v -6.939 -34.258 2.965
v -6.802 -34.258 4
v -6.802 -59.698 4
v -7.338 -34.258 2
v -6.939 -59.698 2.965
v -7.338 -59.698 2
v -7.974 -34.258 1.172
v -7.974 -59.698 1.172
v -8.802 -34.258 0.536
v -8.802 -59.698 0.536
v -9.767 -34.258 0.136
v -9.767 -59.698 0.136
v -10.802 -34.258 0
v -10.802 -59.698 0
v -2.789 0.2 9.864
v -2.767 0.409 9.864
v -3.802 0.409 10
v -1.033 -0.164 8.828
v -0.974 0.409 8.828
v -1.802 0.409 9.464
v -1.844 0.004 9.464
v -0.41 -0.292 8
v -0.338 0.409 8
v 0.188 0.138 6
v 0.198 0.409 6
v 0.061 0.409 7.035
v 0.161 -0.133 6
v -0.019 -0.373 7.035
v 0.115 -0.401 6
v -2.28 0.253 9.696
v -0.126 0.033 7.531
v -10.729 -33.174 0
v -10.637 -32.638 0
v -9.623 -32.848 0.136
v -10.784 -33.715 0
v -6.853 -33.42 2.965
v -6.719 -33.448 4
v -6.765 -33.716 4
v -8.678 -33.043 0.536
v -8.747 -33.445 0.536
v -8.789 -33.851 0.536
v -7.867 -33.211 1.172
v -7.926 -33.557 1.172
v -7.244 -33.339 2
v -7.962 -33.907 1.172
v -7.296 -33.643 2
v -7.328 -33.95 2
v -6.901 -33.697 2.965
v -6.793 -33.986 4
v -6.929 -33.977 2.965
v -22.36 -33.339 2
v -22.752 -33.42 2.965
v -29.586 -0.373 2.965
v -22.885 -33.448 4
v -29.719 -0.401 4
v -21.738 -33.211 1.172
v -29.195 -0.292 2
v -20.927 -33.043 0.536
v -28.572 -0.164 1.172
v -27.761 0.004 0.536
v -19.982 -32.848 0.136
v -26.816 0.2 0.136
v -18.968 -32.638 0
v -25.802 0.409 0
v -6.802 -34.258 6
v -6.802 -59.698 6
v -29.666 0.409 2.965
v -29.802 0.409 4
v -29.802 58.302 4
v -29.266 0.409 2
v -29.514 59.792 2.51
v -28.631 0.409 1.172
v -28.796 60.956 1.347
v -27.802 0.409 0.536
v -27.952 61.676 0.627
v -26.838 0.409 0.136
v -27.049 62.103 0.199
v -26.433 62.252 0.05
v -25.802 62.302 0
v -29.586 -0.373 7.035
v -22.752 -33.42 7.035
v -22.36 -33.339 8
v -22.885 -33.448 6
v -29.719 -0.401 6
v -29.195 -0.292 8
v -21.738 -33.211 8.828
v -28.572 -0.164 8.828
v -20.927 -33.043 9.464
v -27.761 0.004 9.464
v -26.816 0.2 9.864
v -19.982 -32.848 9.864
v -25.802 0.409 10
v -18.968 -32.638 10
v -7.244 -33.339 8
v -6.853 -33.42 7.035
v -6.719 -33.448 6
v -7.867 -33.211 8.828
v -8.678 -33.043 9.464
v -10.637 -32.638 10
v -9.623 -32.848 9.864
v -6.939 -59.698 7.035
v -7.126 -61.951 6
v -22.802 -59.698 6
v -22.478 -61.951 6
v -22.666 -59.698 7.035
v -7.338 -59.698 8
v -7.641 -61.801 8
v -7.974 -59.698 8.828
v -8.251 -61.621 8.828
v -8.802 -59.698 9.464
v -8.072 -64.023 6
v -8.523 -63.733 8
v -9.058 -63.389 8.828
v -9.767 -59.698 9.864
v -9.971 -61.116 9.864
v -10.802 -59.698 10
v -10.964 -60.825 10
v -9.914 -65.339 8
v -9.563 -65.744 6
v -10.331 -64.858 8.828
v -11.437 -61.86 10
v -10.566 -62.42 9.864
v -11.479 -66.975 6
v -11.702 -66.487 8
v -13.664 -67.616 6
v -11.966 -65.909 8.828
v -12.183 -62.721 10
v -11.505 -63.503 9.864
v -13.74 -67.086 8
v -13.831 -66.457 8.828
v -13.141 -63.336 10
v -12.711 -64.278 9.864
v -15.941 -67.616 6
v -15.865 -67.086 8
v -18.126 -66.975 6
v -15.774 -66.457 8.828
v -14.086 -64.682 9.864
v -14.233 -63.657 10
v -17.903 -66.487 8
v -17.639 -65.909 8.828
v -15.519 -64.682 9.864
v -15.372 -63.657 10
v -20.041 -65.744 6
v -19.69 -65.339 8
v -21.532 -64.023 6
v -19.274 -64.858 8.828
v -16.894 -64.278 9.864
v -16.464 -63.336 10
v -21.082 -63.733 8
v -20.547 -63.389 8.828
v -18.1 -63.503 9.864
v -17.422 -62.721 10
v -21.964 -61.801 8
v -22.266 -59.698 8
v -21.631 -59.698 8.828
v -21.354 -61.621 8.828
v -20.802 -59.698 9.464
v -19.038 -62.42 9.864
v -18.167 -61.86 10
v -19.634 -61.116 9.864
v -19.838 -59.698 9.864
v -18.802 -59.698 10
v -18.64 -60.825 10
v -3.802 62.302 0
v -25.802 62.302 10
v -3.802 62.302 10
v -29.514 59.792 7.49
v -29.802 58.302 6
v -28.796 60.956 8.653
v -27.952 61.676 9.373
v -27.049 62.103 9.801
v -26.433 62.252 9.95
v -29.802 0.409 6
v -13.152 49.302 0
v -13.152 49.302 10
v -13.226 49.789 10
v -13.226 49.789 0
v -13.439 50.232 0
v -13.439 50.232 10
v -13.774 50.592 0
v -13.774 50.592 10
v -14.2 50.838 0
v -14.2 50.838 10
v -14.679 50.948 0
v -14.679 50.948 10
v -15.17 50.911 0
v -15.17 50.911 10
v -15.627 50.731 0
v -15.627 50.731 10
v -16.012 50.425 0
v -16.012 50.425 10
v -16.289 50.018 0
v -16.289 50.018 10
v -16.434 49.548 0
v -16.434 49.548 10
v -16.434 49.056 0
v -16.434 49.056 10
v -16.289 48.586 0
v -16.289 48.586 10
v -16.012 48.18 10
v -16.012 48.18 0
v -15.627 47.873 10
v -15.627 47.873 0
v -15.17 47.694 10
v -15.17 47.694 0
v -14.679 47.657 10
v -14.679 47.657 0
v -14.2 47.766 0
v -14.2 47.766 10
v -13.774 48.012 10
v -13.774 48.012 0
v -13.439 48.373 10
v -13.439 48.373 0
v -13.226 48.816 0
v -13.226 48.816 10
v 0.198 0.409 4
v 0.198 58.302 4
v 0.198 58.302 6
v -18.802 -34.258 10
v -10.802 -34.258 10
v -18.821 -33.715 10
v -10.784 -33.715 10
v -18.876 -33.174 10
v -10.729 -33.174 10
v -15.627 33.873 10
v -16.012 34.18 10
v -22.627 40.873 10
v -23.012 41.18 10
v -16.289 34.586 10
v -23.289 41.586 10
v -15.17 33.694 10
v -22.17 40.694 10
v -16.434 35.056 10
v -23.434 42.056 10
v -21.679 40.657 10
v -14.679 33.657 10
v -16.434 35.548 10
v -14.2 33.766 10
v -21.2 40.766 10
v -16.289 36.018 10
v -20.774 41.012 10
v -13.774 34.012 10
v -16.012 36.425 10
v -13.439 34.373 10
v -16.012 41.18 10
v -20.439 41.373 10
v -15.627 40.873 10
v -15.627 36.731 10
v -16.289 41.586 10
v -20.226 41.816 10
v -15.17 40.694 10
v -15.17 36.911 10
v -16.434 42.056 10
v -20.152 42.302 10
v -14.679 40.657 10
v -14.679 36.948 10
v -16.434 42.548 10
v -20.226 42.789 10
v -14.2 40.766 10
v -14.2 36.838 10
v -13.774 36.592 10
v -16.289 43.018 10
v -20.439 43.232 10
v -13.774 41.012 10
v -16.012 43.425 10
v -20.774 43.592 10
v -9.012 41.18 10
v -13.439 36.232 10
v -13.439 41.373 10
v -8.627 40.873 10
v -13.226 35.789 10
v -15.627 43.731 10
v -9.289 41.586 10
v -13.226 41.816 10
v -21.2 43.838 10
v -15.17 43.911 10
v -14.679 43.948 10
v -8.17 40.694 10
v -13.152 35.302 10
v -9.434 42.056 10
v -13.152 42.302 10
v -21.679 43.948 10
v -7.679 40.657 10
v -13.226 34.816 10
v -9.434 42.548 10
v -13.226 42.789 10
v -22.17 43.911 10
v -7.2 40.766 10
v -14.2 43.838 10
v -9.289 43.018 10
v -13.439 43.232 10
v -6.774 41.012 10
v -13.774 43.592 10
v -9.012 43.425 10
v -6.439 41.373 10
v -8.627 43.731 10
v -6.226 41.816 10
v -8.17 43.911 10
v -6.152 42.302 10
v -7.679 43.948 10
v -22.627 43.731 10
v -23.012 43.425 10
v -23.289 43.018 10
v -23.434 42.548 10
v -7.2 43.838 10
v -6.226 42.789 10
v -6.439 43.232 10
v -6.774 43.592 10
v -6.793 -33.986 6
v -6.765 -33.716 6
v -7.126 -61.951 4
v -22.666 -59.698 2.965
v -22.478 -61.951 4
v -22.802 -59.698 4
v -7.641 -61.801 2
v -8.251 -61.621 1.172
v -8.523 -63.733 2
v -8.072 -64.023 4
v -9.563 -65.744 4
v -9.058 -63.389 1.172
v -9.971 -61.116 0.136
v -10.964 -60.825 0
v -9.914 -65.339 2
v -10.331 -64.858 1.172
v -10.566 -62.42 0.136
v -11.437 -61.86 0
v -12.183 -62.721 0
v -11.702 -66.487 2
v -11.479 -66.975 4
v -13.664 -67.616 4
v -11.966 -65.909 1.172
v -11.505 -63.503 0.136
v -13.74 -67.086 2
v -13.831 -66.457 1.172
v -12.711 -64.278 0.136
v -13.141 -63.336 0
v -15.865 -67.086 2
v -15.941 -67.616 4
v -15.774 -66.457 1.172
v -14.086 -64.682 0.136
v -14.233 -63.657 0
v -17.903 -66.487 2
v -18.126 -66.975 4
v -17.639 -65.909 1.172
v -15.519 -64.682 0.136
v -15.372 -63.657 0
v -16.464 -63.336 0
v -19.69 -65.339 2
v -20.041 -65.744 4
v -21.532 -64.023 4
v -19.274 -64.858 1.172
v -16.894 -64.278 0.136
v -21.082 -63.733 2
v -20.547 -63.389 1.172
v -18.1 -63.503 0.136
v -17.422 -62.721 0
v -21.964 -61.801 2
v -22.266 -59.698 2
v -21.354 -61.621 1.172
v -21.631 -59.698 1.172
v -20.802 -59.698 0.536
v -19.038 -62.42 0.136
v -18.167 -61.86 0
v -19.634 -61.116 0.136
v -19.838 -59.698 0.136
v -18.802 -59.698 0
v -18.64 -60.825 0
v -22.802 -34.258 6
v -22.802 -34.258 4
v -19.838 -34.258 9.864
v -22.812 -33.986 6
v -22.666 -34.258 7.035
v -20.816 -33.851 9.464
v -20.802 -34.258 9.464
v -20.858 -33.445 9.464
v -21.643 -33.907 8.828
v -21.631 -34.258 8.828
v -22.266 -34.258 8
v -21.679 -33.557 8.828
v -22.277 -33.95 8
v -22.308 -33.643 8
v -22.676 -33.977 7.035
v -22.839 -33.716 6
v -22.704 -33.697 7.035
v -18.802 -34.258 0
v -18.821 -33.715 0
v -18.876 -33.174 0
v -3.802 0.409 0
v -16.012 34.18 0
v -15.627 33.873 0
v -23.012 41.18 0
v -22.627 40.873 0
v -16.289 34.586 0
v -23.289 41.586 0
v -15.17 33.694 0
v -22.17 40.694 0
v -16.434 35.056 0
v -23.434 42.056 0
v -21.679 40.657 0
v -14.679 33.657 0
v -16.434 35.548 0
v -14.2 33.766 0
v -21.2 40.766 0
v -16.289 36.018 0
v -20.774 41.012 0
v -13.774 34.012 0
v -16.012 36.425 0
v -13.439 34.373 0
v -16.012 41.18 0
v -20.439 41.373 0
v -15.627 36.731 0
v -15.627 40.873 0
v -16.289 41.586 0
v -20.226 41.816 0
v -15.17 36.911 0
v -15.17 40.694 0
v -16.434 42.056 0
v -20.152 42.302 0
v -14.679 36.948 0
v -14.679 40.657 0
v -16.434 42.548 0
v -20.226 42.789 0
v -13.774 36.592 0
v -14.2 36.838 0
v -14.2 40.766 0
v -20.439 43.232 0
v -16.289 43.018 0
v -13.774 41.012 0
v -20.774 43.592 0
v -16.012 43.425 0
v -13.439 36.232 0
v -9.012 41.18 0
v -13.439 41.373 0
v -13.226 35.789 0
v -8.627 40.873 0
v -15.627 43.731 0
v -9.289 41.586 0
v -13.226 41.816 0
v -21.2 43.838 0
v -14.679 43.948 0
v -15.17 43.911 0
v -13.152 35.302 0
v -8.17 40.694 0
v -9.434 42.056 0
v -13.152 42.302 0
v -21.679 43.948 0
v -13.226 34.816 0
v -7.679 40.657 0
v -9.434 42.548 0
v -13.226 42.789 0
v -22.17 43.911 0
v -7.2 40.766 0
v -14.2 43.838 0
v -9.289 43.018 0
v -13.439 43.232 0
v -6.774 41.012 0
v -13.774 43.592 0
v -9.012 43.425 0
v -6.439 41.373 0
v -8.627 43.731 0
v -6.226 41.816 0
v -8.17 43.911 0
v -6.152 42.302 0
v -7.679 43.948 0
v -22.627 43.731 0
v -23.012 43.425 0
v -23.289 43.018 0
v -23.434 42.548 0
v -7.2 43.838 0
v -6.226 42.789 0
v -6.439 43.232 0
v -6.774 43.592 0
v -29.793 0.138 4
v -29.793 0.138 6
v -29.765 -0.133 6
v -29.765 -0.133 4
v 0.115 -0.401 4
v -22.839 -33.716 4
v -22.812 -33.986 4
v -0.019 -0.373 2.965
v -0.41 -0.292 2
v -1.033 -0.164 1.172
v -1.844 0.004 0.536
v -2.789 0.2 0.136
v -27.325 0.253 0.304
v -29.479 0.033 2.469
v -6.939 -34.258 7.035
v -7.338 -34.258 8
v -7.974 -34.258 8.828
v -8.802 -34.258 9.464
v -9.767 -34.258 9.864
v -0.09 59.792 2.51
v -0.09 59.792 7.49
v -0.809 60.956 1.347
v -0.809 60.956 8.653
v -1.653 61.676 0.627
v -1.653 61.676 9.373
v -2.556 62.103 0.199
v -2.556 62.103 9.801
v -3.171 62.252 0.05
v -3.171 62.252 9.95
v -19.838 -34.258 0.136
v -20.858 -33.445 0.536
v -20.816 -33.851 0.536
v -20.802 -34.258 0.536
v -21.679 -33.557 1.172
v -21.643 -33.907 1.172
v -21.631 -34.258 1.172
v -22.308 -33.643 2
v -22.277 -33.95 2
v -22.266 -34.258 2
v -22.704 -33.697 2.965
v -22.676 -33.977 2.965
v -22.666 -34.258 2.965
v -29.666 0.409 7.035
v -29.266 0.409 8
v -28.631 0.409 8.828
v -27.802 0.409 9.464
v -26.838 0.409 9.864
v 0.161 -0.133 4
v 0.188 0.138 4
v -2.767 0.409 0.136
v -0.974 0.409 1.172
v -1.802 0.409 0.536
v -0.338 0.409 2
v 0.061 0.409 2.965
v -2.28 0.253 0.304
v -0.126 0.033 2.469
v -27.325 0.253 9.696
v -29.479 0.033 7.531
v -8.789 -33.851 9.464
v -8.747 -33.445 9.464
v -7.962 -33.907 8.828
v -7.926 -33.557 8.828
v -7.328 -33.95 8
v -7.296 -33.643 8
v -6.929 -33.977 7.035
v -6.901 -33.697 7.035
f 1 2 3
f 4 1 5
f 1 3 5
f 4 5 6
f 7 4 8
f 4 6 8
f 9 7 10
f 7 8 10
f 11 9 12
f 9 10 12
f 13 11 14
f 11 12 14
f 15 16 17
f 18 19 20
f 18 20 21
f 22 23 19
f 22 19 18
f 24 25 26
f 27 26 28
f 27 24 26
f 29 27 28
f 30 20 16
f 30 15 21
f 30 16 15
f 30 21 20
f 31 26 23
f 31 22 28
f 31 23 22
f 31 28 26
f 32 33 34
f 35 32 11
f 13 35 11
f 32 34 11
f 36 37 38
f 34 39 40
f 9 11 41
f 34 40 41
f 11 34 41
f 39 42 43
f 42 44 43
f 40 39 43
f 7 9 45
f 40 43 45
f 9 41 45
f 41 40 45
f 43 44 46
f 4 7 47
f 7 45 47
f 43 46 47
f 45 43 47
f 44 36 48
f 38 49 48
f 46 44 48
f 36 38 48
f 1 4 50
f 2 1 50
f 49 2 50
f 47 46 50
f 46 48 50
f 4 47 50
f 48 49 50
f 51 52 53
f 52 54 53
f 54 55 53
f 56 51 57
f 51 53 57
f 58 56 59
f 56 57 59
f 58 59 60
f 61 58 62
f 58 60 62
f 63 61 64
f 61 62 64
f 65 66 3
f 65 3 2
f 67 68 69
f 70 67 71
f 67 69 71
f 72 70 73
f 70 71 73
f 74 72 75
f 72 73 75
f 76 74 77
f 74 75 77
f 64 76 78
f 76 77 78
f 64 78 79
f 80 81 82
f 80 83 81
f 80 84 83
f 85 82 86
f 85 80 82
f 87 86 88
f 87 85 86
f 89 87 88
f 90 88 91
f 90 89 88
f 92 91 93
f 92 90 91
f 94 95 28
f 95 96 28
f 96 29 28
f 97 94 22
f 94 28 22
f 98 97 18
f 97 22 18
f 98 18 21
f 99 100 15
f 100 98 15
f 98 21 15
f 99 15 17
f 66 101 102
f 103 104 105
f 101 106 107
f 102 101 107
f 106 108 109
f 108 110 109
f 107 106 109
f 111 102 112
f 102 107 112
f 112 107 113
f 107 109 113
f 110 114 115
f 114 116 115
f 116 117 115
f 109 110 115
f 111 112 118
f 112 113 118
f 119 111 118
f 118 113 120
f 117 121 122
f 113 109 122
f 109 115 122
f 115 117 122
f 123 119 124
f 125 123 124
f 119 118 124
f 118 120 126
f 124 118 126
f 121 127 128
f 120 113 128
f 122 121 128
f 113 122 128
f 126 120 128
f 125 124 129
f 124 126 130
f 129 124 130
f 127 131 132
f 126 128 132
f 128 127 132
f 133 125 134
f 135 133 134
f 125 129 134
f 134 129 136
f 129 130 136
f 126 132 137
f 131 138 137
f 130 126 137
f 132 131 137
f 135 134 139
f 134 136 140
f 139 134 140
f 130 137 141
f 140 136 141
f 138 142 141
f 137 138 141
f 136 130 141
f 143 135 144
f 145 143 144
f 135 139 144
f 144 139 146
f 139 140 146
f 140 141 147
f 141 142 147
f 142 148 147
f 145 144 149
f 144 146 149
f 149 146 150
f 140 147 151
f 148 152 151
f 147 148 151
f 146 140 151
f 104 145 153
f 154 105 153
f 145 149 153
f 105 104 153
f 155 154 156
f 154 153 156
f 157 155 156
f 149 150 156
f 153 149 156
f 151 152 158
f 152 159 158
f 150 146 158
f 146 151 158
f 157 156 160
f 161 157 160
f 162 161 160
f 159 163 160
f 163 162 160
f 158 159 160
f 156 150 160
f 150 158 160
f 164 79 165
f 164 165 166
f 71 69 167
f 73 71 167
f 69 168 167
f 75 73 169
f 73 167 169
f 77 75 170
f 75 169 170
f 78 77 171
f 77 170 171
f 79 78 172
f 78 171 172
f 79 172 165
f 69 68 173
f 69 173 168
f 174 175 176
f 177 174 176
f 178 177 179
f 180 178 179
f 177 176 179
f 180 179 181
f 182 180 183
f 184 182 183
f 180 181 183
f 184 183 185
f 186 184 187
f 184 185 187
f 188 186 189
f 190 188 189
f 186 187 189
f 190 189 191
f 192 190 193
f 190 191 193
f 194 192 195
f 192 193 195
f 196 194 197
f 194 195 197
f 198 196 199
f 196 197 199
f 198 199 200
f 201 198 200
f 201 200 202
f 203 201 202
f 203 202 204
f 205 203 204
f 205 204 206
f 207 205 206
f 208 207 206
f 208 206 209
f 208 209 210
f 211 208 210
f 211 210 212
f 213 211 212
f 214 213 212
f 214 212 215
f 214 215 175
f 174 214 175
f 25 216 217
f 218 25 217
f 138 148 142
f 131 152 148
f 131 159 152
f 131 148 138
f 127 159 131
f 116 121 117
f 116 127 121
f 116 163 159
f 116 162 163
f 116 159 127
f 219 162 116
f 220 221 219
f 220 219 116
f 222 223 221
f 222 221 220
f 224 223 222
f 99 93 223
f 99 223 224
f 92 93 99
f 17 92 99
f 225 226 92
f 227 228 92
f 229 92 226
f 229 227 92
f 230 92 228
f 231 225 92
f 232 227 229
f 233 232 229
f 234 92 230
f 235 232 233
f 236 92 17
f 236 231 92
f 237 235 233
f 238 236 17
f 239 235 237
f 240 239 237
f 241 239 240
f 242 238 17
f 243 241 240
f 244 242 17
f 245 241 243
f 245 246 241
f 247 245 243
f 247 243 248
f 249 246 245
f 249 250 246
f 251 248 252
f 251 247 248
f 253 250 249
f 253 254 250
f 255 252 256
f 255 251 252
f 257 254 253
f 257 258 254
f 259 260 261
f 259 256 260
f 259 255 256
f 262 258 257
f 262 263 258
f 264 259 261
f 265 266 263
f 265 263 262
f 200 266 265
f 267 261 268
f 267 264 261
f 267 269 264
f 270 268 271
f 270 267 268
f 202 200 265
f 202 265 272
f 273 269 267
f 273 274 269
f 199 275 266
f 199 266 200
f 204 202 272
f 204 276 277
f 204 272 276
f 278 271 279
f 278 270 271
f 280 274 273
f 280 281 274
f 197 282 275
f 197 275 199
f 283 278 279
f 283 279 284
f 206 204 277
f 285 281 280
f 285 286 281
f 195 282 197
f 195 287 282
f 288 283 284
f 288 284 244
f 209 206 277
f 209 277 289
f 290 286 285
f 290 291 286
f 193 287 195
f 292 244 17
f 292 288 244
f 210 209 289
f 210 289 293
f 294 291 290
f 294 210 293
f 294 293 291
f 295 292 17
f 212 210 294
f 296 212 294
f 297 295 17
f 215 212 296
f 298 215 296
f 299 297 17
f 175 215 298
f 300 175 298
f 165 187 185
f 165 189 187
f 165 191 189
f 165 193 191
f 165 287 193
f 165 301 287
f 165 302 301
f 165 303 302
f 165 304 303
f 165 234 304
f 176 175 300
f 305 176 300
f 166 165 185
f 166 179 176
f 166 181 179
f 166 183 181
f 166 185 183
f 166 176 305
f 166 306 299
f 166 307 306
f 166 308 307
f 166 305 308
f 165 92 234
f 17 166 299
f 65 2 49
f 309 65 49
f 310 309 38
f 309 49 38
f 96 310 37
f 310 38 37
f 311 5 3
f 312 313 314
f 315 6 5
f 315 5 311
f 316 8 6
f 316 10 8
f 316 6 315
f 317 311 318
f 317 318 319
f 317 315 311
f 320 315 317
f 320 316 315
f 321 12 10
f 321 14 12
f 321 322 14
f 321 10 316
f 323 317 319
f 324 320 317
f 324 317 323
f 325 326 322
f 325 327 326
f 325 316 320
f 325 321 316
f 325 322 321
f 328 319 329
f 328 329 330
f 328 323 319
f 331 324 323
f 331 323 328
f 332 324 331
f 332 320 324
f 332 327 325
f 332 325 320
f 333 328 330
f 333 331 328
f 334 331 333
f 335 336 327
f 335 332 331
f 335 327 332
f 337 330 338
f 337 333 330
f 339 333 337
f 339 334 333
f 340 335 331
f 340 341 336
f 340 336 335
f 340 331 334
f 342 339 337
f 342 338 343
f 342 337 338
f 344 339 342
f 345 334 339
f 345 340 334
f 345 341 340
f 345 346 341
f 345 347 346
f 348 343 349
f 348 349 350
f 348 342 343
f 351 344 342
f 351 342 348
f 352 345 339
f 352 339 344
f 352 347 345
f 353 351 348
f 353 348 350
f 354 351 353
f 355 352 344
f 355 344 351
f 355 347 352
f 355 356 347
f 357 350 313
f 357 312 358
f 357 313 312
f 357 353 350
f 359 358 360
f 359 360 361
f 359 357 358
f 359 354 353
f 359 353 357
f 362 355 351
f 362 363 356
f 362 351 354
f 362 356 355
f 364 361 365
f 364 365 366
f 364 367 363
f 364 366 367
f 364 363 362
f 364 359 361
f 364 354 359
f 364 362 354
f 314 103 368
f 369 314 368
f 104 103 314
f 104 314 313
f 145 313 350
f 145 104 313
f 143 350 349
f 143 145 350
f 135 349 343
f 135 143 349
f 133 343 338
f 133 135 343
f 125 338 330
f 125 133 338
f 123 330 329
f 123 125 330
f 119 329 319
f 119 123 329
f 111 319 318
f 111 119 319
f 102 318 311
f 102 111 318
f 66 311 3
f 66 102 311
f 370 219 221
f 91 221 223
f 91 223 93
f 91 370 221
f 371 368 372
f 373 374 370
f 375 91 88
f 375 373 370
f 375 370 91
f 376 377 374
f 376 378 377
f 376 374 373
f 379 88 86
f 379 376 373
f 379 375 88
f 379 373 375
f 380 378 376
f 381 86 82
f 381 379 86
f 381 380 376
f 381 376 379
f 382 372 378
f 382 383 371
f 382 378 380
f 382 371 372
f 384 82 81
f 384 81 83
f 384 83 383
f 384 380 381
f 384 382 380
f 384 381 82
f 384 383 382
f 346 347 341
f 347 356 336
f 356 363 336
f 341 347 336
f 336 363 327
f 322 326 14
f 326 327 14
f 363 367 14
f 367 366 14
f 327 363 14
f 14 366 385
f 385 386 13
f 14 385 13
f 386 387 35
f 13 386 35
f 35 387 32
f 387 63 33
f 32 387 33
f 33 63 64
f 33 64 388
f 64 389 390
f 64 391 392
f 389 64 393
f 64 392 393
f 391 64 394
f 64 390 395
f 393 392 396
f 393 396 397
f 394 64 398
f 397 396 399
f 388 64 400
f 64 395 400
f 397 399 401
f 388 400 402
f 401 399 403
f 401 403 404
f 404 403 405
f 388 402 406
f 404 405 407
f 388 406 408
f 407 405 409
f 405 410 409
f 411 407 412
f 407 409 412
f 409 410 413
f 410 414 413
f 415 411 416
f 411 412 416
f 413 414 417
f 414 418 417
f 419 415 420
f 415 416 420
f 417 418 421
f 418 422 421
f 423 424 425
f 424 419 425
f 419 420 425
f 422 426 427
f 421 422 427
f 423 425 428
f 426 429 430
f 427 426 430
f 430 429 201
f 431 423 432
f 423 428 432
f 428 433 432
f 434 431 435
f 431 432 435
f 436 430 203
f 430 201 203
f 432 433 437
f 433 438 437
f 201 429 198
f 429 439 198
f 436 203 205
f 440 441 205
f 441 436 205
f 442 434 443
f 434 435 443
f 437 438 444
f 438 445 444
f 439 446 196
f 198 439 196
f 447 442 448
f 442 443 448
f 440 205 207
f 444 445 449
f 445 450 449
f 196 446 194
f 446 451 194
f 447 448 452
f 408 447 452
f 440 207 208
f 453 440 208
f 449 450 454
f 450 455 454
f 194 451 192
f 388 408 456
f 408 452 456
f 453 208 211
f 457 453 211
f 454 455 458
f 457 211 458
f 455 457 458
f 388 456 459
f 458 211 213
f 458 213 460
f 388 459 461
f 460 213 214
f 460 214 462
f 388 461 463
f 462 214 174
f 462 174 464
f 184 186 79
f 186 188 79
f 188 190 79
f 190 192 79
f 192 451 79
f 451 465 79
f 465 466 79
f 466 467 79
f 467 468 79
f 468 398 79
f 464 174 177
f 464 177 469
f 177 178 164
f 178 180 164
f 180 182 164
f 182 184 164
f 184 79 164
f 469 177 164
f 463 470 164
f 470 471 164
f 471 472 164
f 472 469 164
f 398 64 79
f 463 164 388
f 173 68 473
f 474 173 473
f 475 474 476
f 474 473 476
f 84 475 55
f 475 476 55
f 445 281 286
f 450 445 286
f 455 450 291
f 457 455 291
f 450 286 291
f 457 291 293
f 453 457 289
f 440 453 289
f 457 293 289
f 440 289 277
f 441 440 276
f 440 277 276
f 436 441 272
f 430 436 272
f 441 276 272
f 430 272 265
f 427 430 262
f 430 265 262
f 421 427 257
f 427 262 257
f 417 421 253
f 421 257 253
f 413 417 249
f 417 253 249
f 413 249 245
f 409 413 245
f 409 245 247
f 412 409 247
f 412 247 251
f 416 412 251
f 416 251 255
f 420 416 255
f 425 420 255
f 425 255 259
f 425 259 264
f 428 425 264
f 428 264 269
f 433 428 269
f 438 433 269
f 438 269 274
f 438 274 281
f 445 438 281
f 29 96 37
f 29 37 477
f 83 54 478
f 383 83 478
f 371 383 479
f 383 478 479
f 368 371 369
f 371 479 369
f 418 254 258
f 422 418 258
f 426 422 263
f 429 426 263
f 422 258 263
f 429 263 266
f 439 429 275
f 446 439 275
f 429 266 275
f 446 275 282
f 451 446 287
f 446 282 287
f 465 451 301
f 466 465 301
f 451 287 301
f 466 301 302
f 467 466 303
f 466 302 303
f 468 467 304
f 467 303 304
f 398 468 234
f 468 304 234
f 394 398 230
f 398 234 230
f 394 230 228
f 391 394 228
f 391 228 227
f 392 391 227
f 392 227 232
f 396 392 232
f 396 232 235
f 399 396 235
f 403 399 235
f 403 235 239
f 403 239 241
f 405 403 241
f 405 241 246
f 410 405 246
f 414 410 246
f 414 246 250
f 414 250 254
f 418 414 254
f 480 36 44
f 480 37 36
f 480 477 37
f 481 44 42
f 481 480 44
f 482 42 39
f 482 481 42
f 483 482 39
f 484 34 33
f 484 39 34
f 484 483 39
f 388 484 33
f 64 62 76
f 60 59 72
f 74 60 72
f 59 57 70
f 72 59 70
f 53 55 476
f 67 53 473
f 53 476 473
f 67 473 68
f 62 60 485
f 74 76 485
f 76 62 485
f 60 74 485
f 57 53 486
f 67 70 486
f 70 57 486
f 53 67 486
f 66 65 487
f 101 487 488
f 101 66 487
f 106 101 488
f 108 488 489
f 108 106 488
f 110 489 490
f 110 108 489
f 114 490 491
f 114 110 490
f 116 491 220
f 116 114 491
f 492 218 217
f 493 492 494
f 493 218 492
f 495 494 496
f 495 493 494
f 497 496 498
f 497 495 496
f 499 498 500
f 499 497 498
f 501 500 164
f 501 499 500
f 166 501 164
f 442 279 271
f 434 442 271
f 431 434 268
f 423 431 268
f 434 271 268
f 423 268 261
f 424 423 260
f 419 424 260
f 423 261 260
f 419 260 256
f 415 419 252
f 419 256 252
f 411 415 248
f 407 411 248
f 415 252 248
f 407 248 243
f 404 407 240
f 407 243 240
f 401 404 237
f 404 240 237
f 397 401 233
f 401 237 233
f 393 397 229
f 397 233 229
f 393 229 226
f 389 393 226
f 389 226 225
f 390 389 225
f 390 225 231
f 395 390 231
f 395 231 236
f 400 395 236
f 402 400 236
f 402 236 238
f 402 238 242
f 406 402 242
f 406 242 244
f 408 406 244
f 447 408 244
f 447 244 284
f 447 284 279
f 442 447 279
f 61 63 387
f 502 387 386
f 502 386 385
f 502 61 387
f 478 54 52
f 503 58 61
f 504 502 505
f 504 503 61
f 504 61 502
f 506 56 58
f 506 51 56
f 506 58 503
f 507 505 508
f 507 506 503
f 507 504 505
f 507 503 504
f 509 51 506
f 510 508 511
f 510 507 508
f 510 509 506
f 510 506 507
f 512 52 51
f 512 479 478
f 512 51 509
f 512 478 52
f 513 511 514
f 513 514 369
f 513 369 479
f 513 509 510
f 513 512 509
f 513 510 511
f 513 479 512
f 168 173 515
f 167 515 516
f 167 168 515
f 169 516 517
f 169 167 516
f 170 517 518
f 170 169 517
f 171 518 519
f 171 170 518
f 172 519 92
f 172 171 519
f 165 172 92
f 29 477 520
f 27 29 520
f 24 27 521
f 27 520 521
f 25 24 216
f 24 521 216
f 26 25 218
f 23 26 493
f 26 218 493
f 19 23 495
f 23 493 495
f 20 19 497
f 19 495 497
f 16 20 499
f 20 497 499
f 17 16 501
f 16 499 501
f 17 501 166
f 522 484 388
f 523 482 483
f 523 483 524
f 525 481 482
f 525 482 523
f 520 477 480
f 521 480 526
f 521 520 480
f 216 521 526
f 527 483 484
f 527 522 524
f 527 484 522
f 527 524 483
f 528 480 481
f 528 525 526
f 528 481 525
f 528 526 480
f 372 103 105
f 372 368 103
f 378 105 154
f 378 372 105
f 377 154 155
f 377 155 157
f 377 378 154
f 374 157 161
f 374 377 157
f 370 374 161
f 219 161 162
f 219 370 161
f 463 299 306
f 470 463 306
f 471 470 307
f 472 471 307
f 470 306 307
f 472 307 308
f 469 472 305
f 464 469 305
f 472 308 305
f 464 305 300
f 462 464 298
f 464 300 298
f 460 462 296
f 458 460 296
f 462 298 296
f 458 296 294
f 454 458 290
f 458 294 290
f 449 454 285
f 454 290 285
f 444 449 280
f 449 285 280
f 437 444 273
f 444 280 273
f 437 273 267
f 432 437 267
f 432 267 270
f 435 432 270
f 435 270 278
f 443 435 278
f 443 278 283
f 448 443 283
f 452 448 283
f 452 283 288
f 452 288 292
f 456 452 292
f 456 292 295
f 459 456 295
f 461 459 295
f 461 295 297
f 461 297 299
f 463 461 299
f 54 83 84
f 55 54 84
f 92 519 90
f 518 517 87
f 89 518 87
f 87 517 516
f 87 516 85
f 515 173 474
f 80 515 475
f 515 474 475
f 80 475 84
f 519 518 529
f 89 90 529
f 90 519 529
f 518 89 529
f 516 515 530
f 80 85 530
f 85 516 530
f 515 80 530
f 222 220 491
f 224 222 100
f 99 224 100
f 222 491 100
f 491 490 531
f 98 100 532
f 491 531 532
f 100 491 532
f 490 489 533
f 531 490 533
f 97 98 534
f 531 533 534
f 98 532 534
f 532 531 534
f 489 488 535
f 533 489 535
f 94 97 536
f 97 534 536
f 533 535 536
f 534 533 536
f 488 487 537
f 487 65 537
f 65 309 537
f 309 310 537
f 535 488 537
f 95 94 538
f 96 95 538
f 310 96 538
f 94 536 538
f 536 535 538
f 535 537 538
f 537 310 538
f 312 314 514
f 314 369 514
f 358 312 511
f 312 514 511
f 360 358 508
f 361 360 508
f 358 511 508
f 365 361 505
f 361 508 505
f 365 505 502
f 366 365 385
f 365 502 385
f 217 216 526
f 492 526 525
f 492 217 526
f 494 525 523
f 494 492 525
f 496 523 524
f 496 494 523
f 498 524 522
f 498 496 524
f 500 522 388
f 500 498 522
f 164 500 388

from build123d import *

# Parameters (mm, degrees)
SKETCH2_W           = 30
SKETCH2_H           = 130
BOSS_EXTRUDE1_DEPTH = 10
CUT_EXTRUDE3_DEPTH  = 75.64013832
FILLET3_RADIUS      = 8
FILLET3_LENGTH      = 10
FILLET4_R           = 4
SKETCH3_R           = 1.65
CUT_EXTRUDE4_DEPTH  = 75.64013841


with BuildPart() as part:
    # Sketch2 → Boss-Extrude1 (new body)
    with BuildSketch(Plane.XY):
        with Locations((-14.802371542, -2.697628458)):
            Rectangle(SKETCH2_W, SKETCH2_H)
    extrude(amount=BOSS_EXTRUDE1_DEPTH)

    # Sketch6 → Cut-Extrude3 (cut, through all)
    with BuildSketch(Plane.XY.offset(10)):
        Polygon((-29.802371542, -67.697628458), (-22.802371542, -67.697628458), (-22.802371542, -33.848814229), (-29.802371542, 0), align=None)
        Polygon((0.197628458, -67.697628458), (-6.802371542, -67.697628458), (-6.802371542, -33.848814229), (0.197628458, 0), align=None)
    extrude(amount=-CUT_EXTRUDE3_DEPTH, mode=Mode.SUBTRACT)

    # Fillet3: full round fillet: the end face becomes a half cylinder, R = half its width
    fillet3_face = Plane((-14.802371542, -67.697628458, 5), x_dir=(0, 0, 1), z_dir=(0, -1, 0))  # on the end face: x along it, z out of the body
    fillet3_slab = fillet3_face.offset(-FILLET3_RADIUS / 2) * Box(FILLET3_LENGTH, 2 * FILLET3_RADIUS, FILLET3_RADIUS, mode=Mode.PRIVATE)  # the body's end, R deep
    fillet3_round = Plane((-14.802371542, -59.697628458, 5), x_dir=(0, -1, 0), z_dir=(0, 0, 1)) * Cylinder(FILLET3_RADIUS, FILLET3_LENGTH, mode=Mode.PRIVATE)  # its axis R under the face
    add(fillet3_slab - fillet3_round, mode=Mode.SUBTRACT)

    # Fillet4
    fillet4_edges = [part.edges().sort_by_distance(p)[0] for p in [
        (0.197628458, 31.151185771, 0),
        (0.197628458, 31.151185771, 10),
        (-3.302371542, -16.924407115, 10),
        (-6.802371542, -33.848814229, 5),
        (0.197628458, 0, 5),
        (-3.302371542, -16.924407115, 0),
        (-26.302371542, -16.924407115, 10),
        (-29.802371542, 0, 5),
        (-22.802371542, -33.848814229, 5),
        (-26.302371542, -16.924407115, 0),
        (-22.802371542, -46.773221344, 10),
        (-22.802371542, -46.773221344, 0),
        (-6.802371542, -46.773221344, 10),
        (-6.802371542, -46.773221344, 0),
        (-14.802371542, -67.697628458, 0),
        (-14.802371542, -67.697628458, 10),
        (-29.802371542, 31.151185771, 10),
        (-29.802371542, 31.151185771, 0),
        (-29.802371542, 62.302371542, 5),
        (0.197628458, 62.302371542, 5),
    ]]
    fillet(fillet4_edges, radius=FILLET4_R)

    # Sketch3 → Cut-Extrude4 (cut, through all)
    with BuildSketch(Plane.XY.offset(10)):
        with Locations((-21.802371542, 42.302371542)):
            Circle(SKETCH3_R)
        with Locations((-14.802371542, 49.302371542)):
            Circle(SKETCH3_R)
        with Locations((-7.802371542, 42.302371542)):
            Circle(SKETCH3_R)
        with Locations((-14.802371542, 35.302371542)):
            Circle(SKETCH3_R)
        with Locations((-14.802371542, 42.302371542)):
            Circle(SKETCH3_R)
    extrude(amount=-CUT_EXTRUDE4_DEPTH, mode=Mode.SUBTRACT)


solid = part.part
